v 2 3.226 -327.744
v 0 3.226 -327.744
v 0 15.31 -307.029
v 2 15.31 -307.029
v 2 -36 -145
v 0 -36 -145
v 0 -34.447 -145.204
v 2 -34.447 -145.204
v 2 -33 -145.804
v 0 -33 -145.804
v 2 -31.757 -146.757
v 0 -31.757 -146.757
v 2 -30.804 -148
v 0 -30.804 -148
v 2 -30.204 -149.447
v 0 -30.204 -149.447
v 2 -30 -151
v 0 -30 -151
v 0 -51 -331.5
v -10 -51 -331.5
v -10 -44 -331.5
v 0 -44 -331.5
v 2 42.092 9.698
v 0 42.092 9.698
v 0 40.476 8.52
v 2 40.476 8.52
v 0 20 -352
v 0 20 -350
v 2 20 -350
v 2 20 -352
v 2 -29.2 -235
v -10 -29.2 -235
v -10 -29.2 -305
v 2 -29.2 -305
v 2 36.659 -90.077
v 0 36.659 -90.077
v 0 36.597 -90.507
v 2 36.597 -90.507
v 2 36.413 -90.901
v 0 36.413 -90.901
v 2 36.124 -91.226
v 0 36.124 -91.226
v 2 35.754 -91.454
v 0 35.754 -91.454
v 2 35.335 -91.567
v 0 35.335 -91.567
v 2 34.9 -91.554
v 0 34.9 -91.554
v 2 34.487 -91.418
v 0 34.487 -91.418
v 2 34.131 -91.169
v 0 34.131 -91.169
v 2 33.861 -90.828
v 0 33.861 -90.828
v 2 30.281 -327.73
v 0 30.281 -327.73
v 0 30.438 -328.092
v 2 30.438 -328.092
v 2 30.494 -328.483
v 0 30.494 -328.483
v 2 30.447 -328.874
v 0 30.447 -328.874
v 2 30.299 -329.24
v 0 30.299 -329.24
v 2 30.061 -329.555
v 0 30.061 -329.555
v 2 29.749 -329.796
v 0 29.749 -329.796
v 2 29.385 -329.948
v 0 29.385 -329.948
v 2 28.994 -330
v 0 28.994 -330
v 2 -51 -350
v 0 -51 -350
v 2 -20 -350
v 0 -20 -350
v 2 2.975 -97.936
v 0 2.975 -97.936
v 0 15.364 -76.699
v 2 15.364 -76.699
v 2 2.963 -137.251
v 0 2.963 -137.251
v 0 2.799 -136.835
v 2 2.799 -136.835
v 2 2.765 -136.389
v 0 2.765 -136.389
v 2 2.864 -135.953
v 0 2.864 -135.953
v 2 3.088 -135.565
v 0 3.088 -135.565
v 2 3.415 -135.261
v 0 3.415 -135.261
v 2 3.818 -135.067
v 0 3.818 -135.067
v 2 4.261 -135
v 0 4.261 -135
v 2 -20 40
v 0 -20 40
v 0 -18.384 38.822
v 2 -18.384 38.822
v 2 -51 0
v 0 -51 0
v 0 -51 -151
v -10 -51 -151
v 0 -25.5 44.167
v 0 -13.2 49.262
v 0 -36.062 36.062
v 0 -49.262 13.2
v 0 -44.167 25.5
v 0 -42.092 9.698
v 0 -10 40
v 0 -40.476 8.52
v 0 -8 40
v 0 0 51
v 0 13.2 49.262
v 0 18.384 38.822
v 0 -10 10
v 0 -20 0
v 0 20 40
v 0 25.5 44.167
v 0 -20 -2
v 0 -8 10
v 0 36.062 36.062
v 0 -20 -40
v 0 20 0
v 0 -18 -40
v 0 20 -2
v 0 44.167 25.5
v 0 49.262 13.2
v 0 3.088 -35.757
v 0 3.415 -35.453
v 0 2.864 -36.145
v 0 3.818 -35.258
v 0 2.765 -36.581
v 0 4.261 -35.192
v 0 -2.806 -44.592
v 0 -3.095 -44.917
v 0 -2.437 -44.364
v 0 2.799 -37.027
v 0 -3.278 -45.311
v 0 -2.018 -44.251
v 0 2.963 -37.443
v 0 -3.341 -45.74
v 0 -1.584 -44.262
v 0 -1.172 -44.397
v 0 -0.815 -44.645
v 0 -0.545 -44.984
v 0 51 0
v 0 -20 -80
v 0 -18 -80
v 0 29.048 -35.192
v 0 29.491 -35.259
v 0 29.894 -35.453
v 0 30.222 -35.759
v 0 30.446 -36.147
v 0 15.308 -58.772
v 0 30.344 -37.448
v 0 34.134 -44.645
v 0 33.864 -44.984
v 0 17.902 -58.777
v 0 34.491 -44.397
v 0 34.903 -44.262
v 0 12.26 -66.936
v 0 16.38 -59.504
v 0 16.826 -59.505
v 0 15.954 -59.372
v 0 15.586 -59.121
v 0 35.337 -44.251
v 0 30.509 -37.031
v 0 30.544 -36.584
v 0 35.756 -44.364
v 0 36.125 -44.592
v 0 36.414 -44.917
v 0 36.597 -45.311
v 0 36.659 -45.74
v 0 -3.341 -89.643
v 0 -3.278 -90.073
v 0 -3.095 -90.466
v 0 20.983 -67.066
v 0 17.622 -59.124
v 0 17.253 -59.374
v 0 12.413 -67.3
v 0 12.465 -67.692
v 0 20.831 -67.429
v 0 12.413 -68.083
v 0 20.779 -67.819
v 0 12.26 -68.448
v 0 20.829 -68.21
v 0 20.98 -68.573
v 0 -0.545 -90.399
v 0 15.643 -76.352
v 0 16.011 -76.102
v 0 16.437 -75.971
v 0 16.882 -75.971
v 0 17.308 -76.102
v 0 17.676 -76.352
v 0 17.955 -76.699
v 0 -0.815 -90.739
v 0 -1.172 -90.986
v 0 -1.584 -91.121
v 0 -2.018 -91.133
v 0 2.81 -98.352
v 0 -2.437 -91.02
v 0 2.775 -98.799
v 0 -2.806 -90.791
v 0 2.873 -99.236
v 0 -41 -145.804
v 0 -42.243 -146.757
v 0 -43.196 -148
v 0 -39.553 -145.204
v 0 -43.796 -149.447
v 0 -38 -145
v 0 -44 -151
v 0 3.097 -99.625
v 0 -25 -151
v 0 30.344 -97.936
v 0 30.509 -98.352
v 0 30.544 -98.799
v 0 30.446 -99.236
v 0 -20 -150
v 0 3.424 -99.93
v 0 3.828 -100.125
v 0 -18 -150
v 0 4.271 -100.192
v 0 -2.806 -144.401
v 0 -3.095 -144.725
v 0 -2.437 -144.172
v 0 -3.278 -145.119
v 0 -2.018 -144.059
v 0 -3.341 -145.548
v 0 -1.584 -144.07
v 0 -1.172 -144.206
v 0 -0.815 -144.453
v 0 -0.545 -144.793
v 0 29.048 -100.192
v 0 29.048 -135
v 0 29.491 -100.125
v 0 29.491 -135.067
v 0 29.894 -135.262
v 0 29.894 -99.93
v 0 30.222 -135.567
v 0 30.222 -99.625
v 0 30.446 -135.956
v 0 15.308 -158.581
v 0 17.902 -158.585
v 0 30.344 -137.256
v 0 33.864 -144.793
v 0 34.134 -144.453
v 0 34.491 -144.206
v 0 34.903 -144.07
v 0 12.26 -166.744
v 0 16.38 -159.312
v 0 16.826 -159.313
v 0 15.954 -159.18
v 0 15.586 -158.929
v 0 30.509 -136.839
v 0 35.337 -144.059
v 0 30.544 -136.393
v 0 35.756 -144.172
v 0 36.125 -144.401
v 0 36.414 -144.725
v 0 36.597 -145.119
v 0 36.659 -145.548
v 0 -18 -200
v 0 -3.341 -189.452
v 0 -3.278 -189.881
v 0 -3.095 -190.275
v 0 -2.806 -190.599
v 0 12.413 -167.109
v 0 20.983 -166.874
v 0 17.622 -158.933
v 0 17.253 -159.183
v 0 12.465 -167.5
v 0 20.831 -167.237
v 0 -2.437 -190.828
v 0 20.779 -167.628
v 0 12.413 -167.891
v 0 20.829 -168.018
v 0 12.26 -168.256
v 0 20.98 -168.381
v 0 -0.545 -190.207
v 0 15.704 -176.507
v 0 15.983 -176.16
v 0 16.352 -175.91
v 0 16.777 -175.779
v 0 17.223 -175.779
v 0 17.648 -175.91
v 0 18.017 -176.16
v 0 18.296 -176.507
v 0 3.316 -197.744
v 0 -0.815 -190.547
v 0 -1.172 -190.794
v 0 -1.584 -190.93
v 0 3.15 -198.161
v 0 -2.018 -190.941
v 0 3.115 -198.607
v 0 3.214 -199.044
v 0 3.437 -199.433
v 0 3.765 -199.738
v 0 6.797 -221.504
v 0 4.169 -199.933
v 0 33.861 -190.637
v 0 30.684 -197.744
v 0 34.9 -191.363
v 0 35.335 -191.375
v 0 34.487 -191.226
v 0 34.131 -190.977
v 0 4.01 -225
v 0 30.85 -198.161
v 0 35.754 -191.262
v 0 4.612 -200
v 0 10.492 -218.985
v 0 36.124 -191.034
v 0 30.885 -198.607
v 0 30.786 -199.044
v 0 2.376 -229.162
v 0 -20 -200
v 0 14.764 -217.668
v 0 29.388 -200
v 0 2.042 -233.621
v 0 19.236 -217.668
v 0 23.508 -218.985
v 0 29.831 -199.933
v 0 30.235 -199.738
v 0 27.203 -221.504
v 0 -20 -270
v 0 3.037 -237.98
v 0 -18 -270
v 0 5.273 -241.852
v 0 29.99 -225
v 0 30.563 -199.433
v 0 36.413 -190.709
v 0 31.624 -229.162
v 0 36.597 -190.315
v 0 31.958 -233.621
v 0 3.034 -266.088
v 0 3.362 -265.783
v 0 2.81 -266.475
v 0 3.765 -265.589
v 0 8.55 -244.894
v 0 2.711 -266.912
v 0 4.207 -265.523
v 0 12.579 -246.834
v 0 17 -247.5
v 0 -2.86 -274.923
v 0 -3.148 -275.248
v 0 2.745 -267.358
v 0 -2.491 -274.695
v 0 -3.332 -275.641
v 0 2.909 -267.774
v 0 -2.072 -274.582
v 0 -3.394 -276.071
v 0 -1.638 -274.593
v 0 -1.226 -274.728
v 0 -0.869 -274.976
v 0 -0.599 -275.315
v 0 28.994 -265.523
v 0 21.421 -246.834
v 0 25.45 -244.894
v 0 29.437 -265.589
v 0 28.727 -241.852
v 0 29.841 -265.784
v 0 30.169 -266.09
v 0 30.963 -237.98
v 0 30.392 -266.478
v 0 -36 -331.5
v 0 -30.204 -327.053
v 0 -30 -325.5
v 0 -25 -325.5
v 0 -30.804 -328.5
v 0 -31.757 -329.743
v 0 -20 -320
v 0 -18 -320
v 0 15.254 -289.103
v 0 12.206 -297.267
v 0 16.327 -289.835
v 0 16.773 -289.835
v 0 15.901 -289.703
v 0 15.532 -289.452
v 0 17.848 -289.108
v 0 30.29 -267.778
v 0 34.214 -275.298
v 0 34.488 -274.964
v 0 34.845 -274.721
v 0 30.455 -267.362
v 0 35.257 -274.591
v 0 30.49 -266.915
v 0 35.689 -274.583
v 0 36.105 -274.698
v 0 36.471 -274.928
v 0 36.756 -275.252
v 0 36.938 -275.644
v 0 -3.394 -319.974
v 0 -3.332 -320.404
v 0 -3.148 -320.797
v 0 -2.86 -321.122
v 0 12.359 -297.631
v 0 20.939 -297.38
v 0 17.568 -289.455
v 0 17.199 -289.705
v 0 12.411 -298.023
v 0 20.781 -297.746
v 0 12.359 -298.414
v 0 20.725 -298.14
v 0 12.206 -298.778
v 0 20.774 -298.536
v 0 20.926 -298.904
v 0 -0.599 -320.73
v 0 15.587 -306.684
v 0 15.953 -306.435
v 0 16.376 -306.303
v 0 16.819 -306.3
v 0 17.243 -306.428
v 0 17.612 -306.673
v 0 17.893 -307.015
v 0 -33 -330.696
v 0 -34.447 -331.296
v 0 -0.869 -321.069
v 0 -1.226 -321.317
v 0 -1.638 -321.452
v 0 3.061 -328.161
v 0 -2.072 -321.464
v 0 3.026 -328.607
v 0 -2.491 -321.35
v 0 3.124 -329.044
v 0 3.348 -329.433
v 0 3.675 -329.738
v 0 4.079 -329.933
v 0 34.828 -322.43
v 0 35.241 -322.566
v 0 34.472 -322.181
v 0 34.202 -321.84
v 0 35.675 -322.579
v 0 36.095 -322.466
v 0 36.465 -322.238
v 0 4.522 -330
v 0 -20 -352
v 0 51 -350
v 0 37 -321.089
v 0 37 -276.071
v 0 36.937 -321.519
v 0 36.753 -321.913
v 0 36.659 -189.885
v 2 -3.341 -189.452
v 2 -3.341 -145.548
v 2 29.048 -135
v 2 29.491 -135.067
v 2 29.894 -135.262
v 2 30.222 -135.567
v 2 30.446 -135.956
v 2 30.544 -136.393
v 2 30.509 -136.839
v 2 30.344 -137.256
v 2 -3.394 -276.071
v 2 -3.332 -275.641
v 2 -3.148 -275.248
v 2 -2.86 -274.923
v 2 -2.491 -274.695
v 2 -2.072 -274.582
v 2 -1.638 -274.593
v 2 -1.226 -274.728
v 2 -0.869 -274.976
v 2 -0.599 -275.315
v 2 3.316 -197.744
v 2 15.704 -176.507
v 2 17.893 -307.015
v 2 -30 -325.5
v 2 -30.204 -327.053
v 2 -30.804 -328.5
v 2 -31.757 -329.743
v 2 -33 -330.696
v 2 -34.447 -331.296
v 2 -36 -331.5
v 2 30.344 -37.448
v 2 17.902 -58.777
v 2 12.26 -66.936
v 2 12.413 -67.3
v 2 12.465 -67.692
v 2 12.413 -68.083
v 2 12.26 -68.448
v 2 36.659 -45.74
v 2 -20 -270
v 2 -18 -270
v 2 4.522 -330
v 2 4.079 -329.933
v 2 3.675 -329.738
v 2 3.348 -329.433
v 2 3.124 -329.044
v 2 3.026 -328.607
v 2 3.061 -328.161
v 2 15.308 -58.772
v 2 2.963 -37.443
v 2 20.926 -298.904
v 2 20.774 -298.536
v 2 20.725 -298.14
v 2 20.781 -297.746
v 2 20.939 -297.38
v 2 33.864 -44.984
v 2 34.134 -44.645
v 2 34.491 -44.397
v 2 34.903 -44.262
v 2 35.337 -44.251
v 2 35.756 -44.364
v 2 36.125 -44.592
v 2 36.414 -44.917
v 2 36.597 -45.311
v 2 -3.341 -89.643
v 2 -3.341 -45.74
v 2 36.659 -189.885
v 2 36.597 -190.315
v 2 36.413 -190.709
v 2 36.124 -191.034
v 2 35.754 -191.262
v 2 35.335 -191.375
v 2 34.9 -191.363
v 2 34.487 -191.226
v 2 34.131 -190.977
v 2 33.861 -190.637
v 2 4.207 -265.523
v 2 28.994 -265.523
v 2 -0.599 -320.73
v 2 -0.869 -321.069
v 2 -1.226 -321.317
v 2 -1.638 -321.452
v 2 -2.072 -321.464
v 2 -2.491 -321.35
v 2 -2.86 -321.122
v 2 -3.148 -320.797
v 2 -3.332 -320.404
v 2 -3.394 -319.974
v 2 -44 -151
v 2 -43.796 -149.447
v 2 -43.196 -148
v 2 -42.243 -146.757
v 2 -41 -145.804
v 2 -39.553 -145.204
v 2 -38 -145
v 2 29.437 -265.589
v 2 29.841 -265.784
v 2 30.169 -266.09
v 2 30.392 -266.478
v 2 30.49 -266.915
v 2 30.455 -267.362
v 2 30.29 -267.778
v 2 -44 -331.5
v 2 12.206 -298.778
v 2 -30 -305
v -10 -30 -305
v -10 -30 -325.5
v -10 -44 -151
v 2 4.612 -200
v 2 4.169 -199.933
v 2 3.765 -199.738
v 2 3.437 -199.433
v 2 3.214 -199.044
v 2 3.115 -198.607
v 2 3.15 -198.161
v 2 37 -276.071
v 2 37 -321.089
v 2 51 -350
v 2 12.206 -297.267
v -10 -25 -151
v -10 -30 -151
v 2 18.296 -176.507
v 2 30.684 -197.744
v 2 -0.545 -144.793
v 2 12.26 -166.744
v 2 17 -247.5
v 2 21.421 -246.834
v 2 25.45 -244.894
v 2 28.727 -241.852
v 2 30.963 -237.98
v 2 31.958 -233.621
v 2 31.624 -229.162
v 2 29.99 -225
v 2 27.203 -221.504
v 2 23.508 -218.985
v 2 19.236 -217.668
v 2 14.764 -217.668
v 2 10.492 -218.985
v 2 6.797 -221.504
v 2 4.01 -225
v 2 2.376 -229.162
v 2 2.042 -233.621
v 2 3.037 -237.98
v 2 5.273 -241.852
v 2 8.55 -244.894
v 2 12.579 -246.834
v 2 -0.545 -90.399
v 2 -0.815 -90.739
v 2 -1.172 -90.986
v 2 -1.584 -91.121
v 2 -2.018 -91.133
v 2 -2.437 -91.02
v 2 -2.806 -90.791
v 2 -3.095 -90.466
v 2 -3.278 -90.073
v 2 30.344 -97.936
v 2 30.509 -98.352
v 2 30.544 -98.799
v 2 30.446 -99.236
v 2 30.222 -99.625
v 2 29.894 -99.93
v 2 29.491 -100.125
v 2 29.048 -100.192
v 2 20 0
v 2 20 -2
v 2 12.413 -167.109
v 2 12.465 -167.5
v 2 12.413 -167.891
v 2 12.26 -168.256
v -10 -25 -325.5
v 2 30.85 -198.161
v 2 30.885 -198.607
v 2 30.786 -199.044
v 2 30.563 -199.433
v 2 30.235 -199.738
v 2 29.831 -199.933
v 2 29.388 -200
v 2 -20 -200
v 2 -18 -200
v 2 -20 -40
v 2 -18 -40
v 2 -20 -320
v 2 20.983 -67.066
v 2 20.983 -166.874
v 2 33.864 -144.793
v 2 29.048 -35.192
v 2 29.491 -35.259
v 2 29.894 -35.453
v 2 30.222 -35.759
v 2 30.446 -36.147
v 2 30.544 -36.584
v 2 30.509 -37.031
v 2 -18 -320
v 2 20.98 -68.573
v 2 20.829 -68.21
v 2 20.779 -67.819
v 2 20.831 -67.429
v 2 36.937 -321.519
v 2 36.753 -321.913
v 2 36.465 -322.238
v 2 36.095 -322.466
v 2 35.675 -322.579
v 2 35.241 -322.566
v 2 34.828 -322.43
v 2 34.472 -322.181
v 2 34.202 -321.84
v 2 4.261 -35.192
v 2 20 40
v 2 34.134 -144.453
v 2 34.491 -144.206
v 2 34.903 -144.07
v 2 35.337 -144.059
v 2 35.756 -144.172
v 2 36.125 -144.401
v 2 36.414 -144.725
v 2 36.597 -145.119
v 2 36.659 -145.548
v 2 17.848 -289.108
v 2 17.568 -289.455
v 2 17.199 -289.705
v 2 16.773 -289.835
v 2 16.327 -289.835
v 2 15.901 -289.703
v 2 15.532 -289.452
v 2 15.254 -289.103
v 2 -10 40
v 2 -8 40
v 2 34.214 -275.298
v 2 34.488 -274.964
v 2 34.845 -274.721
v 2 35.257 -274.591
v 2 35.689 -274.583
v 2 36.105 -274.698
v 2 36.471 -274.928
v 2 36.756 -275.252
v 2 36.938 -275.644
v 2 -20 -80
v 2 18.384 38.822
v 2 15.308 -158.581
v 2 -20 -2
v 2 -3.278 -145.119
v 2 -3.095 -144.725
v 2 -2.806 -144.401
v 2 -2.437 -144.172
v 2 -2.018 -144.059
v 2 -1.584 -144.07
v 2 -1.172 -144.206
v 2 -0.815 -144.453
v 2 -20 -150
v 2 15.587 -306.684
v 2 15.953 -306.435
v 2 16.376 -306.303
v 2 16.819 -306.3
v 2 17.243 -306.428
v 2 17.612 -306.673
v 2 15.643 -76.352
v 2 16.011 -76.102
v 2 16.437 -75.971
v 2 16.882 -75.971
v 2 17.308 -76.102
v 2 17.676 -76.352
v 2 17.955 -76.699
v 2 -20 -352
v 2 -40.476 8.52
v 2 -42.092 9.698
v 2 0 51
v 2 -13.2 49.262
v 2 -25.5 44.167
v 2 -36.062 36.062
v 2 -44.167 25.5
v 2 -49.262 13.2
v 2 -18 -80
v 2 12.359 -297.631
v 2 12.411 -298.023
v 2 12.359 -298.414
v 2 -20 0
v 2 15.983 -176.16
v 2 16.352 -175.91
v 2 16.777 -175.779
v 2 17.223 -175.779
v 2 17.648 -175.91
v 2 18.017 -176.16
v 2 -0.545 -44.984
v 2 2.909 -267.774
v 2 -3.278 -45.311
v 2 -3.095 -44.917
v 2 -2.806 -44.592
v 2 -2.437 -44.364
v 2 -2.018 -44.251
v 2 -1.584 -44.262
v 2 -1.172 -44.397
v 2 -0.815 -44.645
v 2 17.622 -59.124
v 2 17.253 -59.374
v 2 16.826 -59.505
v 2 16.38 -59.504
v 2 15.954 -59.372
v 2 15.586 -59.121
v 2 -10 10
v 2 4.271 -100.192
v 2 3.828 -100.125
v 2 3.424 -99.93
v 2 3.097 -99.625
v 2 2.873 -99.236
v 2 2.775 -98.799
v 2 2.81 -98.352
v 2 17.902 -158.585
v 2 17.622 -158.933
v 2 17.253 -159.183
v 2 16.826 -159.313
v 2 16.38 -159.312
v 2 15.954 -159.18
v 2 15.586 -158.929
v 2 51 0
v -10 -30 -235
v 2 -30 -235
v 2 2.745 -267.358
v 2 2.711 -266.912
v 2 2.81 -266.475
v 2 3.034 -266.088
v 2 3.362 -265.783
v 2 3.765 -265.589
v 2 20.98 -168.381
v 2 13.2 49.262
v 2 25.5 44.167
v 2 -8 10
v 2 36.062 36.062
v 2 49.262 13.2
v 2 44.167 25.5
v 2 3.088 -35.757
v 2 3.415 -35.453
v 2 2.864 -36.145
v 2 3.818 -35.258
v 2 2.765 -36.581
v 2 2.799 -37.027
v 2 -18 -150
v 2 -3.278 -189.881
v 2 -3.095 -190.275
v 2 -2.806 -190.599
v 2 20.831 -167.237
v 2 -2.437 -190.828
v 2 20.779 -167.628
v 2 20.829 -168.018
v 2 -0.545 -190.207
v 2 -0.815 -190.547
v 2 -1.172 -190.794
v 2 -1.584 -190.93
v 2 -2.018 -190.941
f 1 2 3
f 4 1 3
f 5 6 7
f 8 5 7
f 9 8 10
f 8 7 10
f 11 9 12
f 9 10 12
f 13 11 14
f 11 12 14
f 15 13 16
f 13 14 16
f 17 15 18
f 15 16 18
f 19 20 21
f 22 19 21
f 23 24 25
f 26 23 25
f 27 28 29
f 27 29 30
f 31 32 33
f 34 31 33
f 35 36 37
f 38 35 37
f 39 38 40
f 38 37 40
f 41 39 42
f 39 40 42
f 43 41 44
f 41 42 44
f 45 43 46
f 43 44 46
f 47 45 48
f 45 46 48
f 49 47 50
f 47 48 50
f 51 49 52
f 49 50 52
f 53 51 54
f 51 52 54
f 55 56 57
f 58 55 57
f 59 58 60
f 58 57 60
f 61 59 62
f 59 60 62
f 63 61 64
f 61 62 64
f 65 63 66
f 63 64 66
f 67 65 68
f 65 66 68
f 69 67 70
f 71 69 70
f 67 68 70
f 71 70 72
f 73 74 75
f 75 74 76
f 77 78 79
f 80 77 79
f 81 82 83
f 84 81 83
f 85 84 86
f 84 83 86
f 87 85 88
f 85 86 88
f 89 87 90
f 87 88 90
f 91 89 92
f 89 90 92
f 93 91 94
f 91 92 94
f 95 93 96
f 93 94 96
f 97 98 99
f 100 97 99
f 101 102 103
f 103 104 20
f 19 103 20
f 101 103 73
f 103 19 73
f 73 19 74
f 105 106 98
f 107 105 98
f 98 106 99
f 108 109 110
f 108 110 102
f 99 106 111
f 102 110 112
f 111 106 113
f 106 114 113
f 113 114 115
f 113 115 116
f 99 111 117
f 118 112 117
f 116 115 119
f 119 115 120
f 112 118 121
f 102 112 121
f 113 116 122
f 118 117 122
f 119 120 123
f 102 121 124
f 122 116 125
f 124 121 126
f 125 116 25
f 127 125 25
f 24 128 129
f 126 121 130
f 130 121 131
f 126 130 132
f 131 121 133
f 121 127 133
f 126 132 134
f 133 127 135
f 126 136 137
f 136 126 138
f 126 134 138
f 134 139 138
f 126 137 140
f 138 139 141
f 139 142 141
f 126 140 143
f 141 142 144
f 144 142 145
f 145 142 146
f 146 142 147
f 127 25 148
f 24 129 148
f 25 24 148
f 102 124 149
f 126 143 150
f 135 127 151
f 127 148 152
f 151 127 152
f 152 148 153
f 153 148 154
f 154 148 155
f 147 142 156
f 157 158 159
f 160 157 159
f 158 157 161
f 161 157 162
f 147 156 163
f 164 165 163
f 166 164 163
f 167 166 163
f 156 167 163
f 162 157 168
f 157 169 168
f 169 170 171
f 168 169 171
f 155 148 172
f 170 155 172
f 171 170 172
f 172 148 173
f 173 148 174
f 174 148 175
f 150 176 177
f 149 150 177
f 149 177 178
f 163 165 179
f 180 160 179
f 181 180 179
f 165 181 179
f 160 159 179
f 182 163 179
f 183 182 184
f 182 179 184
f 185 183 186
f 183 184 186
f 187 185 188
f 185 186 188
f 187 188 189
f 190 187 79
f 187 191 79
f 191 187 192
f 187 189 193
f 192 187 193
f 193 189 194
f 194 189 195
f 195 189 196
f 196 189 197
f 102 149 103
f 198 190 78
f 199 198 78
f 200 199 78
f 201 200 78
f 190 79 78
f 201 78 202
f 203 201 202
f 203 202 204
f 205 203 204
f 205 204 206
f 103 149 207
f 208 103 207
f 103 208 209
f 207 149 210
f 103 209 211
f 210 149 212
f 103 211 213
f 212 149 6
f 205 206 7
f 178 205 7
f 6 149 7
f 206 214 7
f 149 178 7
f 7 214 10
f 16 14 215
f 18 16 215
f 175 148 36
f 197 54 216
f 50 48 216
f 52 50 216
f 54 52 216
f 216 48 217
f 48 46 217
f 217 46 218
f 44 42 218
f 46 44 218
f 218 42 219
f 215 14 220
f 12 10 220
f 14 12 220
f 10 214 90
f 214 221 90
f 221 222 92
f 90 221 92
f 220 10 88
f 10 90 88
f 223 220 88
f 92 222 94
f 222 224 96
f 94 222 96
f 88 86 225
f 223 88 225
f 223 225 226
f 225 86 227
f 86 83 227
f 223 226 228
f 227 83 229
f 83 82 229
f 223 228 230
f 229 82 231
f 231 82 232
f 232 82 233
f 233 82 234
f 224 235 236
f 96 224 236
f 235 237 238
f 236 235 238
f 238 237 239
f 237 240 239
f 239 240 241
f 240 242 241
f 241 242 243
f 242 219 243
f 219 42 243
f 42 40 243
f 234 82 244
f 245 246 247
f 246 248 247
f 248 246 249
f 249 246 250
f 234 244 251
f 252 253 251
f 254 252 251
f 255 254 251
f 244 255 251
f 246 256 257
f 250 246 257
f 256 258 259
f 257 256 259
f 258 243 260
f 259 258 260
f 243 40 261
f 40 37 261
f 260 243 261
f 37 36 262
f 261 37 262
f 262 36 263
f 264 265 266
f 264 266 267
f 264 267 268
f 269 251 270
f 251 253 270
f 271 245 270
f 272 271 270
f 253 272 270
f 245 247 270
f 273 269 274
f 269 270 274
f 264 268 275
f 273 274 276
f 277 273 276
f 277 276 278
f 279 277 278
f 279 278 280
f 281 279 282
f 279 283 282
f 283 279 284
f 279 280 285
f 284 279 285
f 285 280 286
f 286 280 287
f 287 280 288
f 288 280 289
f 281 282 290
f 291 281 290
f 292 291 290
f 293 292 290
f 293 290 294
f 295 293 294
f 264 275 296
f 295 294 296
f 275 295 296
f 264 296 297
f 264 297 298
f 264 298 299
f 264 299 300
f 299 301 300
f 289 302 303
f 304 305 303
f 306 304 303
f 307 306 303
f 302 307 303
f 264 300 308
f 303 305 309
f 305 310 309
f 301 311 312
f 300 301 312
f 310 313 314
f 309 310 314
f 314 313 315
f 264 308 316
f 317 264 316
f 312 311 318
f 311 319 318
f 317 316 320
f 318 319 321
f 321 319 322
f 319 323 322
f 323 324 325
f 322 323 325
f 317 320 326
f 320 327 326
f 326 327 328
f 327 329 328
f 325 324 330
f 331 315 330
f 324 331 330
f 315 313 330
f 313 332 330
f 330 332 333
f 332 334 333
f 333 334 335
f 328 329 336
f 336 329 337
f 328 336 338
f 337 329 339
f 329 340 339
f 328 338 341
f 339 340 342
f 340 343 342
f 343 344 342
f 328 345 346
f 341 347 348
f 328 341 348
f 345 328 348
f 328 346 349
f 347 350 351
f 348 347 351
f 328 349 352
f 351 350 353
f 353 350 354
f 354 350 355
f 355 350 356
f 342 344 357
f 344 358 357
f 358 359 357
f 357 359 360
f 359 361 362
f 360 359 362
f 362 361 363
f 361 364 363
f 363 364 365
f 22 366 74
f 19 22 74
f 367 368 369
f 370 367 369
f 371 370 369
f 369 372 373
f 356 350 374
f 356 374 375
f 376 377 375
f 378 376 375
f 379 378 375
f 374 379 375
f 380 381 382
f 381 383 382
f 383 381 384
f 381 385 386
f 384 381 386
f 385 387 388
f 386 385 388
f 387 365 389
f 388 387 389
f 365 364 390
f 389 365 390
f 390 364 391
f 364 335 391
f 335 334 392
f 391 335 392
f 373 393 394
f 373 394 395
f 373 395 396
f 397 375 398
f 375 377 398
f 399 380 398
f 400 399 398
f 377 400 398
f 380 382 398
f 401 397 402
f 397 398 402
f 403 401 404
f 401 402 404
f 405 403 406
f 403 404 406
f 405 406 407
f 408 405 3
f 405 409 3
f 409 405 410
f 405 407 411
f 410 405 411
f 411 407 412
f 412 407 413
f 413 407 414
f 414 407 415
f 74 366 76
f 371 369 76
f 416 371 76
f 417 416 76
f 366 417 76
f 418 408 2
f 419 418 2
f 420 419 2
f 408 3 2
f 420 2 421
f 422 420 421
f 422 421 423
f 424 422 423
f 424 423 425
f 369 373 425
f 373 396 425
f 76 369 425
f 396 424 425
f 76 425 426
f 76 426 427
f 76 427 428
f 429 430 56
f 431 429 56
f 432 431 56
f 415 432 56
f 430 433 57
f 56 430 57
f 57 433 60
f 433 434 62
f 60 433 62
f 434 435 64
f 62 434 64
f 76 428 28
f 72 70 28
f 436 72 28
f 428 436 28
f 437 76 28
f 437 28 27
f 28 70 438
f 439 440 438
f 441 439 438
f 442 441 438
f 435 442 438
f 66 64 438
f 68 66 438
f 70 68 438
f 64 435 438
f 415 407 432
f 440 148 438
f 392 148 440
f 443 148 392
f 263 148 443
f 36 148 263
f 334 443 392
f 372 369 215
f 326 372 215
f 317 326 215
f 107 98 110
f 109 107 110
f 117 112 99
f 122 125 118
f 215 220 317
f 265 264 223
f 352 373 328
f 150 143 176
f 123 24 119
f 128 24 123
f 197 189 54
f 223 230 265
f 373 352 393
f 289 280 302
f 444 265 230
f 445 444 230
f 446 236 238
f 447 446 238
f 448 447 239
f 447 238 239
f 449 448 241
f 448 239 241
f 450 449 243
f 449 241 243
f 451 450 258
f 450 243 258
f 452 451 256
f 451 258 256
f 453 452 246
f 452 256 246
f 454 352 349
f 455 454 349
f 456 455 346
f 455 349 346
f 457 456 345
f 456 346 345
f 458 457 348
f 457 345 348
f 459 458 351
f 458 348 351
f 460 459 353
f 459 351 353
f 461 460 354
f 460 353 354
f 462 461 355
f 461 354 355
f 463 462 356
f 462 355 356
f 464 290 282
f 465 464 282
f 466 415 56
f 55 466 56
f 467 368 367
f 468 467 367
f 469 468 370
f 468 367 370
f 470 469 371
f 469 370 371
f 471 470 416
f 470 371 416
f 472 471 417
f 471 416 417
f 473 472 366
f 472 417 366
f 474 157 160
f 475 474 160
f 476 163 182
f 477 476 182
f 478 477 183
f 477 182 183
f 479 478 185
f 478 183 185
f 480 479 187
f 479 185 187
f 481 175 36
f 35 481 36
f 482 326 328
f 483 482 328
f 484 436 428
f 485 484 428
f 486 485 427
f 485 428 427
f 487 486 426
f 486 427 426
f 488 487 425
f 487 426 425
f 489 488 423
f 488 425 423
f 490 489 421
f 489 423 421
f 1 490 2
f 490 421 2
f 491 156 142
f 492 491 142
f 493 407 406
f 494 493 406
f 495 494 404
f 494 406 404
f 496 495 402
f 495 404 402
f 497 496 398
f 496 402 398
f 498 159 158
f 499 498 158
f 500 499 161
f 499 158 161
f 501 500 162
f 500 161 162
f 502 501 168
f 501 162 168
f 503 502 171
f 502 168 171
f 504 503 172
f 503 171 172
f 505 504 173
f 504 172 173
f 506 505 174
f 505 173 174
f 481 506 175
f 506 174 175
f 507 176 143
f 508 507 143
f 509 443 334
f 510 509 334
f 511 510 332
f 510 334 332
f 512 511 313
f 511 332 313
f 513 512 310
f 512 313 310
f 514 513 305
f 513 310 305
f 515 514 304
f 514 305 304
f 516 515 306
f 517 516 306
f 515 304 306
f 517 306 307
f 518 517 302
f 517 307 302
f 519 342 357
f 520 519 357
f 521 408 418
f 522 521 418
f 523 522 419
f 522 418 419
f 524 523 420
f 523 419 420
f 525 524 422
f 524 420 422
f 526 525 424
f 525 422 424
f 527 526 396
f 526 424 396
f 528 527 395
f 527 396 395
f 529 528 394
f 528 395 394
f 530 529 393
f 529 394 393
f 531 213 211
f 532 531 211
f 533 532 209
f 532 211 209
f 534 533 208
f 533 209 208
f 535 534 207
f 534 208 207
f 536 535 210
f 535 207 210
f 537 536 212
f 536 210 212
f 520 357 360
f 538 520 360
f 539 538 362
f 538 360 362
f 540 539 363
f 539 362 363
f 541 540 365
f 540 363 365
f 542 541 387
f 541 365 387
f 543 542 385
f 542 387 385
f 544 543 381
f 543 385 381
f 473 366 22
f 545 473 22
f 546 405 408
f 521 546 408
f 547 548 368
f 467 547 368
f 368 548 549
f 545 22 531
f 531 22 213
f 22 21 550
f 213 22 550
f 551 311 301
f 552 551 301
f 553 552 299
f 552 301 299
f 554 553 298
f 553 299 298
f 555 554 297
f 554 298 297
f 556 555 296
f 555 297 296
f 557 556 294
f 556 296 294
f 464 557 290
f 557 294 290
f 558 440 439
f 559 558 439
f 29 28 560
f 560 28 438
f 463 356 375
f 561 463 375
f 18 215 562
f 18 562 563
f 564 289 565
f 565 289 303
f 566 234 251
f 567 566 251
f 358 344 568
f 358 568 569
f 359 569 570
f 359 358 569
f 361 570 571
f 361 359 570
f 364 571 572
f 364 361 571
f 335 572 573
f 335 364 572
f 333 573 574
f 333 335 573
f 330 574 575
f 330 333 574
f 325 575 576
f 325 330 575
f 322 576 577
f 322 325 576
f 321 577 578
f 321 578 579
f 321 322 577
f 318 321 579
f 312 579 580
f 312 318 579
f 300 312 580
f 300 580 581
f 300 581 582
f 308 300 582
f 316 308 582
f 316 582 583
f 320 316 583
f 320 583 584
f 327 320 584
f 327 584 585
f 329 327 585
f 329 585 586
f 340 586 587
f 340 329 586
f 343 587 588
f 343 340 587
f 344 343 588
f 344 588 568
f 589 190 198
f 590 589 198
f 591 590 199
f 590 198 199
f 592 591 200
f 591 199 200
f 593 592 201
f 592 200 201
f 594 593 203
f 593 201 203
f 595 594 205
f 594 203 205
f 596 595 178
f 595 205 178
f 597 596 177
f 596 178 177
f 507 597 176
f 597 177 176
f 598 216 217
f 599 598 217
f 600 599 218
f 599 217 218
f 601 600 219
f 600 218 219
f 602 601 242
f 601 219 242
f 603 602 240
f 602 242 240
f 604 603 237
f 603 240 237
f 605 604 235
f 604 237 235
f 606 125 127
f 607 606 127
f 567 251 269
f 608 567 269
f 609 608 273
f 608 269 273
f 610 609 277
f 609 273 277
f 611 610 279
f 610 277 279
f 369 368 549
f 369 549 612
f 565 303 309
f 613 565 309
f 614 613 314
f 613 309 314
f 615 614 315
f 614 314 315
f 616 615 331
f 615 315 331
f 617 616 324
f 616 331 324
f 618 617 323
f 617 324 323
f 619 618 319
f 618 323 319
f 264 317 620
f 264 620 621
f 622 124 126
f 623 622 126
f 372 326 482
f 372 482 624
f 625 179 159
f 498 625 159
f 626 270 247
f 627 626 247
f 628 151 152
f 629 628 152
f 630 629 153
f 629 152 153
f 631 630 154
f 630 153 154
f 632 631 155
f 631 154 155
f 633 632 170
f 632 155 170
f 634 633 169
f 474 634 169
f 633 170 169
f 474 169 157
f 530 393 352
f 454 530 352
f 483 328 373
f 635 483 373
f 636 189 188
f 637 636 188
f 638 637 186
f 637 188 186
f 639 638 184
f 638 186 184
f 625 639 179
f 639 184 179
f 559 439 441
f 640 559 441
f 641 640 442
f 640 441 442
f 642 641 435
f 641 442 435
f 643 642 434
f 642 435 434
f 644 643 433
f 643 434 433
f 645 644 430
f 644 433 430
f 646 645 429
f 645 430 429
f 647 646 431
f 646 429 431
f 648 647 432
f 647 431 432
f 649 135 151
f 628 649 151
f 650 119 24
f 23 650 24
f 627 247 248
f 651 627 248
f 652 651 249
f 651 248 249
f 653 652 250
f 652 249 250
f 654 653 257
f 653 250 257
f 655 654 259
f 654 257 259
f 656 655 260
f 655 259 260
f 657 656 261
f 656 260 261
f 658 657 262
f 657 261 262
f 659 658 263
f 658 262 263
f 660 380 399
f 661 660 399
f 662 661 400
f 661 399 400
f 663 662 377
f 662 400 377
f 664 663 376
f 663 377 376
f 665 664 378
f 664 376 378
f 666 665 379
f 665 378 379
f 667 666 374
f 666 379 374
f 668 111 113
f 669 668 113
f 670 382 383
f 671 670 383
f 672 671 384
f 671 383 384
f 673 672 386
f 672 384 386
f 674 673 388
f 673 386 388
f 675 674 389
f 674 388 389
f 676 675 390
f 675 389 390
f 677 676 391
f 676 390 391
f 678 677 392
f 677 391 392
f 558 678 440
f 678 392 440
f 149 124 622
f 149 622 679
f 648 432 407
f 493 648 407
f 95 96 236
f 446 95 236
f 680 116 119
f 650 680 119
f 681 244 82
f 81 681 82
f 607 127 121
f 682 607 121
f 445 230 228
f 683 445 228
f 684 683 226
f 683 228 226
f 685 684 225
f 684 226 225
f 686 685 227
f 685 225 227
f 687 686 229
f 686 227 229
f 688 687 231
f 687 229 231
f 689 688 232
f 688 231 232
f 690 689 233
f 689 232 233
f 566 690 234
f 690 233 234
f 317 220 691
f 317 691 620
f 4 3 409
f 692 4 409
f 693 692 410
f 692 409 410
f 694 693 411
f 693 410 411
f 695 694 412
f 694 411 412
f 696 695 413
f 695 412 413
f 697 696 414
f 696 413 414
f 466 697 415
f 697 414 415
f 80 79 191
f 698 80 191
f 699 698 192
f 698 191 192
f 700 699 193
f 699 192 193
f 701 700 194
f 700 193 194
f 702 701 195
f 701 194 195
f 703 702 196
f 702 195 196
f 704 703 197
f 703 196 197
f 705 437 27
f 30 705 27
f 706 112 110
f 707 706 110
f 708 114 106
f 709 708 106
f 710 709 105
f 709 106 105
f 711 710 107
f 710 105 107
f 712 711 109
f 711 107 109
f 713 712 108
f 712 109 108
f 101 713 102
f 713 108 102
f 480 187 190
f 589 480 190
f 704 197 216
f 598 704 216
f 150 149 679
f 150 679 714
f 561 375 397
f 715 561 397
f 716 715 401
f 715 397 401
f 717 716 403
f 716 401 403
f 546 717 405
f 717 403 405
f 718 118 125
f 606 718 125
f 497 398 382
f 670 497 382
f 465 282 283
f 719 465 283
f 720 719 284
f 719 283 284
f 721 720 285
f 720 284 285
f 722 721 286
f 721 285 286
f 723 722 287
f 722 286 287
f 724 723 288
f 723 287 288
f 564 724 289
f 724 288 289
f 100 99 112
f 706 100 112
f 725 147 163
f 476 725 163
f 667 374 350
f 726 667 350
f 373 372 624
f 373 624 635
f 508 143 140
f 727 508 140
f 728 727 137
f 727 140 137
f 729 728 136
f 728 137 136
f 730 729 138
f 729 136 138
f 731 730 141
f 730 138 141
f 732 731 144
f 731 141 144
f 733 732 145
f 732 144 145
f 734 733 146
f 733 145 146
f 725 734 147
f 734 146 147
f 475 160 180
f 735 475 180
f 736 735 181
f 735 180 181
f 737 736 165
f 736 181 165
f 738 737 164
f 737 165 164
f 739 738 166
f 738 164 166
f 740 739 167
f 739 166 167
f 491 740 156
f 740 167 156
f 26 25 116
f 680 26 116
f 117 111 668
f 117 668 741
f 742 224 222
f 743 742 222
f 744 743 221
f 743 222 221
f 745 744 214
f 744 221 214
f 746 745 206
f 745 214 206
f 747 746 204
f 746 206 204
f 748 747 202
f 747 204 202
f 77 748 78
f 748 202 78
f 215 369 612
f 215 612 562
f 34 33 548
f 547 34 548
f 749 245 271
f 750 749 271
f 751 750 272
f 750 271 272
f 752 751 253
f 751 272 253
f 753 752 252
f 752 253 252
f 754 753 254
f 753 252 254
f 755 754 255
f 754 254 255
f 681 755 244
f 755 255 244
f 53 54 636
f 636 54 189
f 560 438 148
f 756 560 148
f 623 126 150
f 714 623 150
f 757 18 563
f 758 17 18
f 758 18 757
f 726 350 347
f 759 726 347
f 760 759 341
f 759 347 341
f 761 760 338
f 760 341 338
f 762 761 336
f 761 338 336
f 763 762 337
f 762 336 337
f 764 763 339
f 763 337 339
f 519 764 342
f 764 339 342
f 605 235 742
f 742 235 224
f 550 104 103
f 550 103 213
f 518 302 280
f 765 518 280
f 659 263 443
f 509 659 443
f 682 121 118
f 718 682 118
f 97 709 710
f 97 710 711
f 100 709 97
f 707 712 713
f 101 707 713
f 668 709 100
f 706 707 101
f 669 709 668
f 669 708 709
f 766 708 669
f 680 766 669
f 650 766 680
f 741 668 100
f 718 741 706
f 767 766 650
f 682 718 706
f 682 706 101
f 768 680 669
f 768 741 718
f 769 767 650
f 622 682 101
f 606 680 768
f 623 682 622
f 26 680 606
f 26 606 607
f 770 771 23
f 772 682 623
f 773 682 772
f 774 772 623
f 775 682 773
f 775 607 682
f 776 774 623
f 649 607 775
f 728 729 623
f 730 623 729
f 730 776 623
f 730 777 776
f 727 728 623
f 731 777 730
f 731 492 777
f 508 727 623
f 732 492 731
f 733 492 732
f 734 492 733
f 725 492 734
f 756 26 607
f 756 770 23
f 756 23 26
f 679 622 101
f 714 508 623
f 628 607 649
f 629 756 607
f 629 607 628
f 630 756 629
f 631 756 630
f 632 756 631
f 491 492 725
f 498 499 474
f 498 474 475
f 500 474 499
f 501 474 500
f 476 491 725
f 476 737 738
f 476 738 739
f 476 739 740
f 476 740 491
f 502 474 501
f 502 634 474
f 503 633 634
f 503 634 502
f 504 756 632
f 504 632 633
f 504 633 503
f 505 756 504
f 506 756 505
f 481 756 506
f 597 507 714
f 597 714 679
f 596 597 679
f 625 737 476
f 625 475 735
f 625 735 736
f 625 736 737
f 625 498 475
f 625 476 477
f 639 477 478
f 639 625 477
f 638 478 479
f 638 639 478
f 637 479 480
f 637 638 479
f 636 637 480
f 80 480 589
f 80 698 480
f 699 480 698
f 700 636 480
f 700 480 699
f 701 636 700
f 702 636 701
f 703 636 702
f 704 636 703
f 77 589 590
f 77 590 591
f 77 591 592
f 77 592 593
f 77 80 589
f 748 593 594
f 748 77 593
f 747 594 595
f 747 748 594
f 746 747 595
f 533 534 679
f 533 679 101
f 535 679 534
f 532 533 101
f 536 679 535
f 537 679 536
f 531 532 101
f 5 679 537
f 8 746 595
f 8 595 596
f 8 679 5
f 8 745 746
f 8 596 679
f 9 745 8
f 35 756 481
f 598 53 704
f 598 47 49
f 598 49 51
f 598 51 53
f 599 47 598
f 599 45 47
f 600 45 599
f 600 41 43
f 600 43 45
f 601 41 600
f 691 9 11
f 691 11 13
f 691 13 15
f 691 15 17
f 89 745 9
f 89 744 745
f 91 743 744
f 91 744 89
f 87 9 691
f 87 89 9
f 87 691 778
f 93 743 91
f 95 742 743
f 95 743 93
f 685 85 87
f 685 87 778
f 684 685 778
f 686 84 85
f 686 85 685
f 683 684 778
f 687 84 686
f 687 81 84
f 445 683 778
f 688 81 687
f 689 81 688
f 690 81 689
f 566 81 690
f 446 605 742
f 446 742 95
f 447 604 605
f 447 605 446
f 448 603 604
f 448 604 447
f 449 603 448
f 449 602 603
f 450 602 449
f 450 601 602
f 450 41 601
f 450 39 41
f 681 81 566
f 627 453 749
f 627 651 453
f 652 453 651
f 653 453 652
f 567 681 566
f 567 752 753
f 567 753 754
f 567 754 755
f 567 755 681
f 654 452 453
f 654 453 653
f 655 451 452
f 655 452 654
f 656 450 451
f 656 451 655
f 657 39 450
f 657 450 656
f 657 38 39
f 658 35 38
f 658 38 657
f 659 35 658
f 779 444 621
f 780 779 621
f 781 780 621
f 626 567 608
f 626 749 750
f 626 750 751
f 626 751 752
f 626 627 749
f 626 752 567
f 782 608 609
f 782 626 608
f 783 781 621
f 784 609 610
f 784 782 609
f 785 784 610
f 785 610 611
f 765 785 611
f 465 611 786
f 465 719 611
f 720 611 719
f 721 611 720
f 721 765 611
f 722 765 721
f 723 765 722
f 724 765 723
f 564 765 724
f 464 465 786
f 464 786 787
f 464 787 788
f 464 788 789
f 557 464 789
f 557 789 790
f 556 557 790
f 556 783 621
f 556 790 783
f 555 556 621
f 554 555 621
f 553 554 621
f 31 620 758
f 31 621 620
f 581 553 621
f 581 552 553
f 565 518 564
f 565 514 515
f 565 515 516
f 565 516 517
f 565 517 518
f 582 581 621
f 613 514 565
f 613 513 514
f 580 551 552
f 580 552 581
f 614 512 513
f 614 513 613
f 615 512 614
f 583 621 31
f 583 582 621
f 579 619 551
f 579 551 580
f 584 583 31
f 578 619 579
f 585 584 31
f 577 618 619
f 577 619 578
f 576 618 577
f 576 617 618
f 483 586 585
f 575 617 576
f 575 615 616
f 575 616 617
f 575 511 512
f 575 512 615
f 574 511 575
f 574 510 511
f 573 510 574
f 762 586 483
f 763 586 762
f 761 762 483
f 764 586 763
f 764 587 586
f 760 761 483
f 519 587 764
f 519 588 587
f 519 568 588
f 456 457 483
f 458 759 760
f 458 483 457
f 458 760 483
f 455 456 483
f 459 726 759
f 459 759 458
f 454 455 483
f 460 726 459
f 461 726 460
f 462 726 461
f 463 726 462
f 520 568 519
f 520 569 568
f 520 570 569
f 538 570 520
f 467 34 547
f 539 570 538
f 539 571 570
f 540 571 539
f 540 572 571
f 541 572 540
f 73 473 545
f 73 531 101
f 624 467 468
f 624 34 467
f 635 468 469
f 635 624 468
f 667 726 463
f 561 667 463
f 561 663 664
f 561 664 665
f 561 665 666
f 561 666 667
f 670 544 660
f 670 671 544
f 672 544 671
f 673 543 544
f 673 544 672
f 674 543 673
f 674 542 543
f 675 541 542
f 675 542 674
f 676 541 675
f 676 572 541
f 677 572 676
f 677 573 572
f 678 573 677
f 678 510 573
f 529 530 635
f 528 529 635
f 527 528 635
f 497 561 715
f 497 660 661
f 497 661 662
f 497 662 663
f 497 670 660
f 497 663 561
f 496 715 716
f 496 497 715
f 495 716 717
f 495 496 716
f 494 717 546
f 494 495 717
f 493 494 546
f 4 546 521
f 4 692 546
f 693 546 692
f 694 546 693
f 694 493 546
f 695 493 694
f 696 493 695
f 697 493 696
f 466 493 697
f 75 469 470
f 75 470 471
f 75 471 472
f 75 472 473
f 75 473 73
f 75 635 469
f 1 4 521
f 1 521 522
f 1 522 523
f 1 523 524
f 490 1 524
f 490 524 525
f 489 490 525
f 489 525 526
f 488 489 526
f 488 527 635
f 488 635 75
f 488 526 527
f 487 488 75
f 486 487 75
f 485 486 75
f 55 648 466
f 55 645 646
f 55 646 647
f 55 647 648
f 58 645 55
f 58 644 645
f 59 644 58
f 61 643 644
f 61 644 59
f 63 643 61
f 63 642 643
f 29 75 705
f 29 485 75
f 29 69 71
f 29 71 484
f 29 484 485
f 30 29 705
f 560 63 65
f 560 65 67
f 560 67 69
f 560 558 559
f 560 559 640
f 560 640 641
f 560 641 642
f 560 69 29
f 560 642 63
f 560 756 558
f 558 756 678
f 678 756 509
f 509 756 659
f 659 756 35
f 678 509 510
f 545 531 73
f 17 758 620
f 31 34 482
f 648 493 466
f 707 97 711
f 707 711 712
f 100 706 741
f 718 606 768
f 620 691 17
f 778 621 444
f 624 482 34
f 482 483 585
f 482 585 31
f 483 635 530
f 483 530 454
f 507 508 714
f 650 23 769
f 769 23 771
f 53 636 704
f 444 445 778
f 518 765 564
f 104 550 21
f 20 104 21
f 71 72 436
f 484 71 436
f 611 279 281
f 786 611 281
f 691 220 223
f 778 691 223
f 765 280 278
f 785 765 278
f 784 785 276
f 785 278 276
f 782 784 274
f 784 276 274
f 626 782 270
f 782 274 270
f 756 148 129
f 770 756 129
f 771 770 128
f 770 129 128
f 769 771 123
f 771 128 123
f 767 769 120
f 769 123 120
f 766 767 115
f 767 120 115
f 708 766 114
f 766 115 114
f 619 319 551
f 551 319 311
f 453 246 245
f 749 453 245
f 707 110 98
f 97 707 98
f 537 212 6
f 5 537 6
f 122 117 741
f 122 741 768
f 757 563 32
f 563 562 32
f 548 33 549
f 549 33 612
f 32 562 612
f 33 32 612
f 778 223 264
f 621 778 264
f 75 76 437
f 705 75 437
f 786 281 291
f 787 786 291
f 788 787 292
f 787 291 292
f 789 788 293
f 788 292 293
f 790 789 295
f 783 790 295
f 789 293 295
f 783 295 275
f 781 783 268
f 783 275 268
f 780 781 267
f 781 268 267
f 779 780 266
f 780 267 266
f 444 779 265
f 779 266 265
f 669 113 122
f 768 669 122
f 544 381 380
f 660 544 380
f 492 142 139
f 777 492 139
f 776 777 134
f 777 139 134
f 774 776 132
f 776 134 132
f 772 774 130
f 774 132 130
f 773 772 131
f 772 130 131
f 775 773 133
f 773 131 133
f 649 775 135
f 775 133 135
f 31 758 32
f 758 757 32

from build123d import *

# Parameters (mm, degrees)
SKETCH_1_W      = 40
SKETCH_1_H      = 2
SKETCH_1_W_2    = 50
SKETCH_1_R      = 15
SKETCH_1_W_3    = 30
SKETCH_1_W_4    = 2
SKETCH_1_H_2    = 40
EXTRUDE_3_DEPTH = 2
SKETCH_2_W      = 180.5
SKETCH_2_H      = 7
EXTRUDE_4_DEPTH = 12


with BuildPart() as part:
    # 草图1 → 凸台-拉伸3 (new body)
    # profile 1 of 4: a face of its own
    with BuildSketch(Plane(origin=(0, 0, 0), x_dir=(0, 0, -1), z_dir=(1, 0, 0))):
        Polygon((139, 51), (0, 51), (0, 20), (2, 20), (2, -20), (0, -20), (0, -51), (350, -51), (350, -20), (350, 20), (350, 51), (337.5, 51), (331.5, 51), (145, 51), align=None)
        with Locations((59.999999544, -18.999999639)):
            Rectangle(SKETCH_1_W, SKETCH_1_H, mode=Mode.SUBTRACT)
        with BuildLine():
            Line((145, -38), (145, -36))
            ThreePointArc((145, -36), (146.757359313, -31.757359313), (151, -30))
            Line((151, -30), (235, -30))
            Line((235, -30), (235, -29.2))
            Line((235, -29.2), (305, -29.2))
            Line((305, -29.2), (305, -30))
            Line((305, -30), (325.5, -30))
            ThreePointArc((325.5, -30), (329.742640687, -31.757359313), (331.5, -36))
            Line((331.5, -36), (331.5, -39))
            Line((331.5, -39), (331.5, -44))
            Line((331.5, -44), (325.5, -44))
            Line((325.5, -44), (151, -44))
            ThreePointArc((151, -44), (146.757359313, -42.242640687), (145, -38))
        make_face(mode=Mode.SUBTRACT)
        with Locations((174.999999544, -18.999999639)):
            Rectangle(SKETCH_1_W_2, SKETCH_1_H, mode=Mode.SUBTRACT)
        with Locations((294.999999544, -18.999999639)):
            Rectangle(SKETCH_1_W_2, SKETCH_1_H, mode=Mode.SUBTRACT)
        with BuildLine():
            Line((35.191745107, 4.260800891), (35.191745107, 29.047933032))
            ThreePointArc((35.191745107, 29.047933032), (35.944654017, 30.348646261), (37.447551645, 30.343601384))
            Line((37.447551645, 30.343601384), (58.776761499, 17.901562302))
            ThreePointArc((58.776761499, 17.901562302), (59.520952796, 16.603345479), (58.772354511, 15.307664881))
            Line((58.772354511, 15.307664881), (37.443144656, 2.962571821))
            ThreePointArc((37.443144656, 2.962571821), (35.942445208, 2.961358833), (35.191745107, 4.260800891))
        make_face(mode=Mode.SUBTRACT)
        with BuildLine():
            Line((89.643364252, -3.340511469), (45.740125962, -3.340511469))
            ThreePointArc((45.740125962, -3.340511469), (44.292109641, -2.231981438), (44.984319423, -0.544843118))
            Line((44.984319423, -0.544843118), (66.935938568, 12.26026805))
            ThreePointArc((66.935938568, 12.26026805), (67.691745107, 12.464599699), (68.447551645, 12.26026805))
            Line((68.447551645, 12.26026805), (90.39917079, -0.544843118))
            ThreePointArc((90.39917079, -0.544843118), (91.091380572, -2.231981438), (89.643364252, -3.340511469))
        make_face(mode=Mode.SUBTRACT)
        with BuildLine():
            ThreePointArc((97.935938568, 30.343601384), (99.438836196, 30.348646261), (100.191745107, 29.047933032))
            Line((100.191745107, 29.047933032), (100.191745107, 4.27104403))
            ThreePointArc((100.191745107, 4.27104403), (99.438836196, 2.970330801), (97.935938568, 2.975375678))
            Line((97.935938568, 2.975375678), (76.698605138, 15.36382018))
            ThreePointArc((76.698605138, 15.36382018), (75.954411676, 16.659488531), (76.698605138, 17.955156882))
            Line((76.698605138, 17.955156882), (97.935938568, 30.343601384))
        make_face(mode=Mode.SUBTRACT)
        with BuildLine():
            Line((134.999999544, 4.260800891), (134.999999544, 29.047933032))
            ThreePointArc((134.999999544, 29.047933032), (135.752908454, 30.348646261), (137.255806082, 30.343601384))
            Line((137.255806082, 30.343601384), (158.585015936, 17.901562302))
            ThreePointArc((158.585015936, 17.901562302), (159.329207233, 16.603345479), (158.580608948, 15.307664881))
            Line((158.580608948, 15.307664881), (137.251399093, 2.962571821))
            ThreePointArc((137.251399093, 2.962571821), (135.750699645, 2.961358833), (134.999999544, 4.260800891))
        make_face(mode=Mode.SUBTRACT)
        with BuildLine():
            ThreePointArc((44.984319423, 33.86382018), (44.292109641, 35.5509585), (45.740125962, 36.659488531))
            Line((45.740125962, 36.659488531), (90.076890905, 36.659488531))
            ThreePointArc((90.076890905, 36.659488531), (91.525570236, 35.548497783), (90.828290455, 33.861259462))
            Line((90.828290455, 33.861259462), (68.573204266, 20.980280188))
            ThreePointArc((68.573204266, 20.980280188), (67.819256245, 20.778511422), (67.065998178, 20.982840906))
            Line((67.065998178, 20.982840906), (44.984319423, 33.86382018))
        make_face(mode=Mode.SUBTRACT)
        with BuildLine():
            Line((189.451618689, -3.340511469), (145.548380399, -3.340511469))
            ThreePointArc((145.548380399, -3.340511469), (144.100364078, -2.231981438), (144.79257386, -0.544843118))
            Line((144.79257386, -0.544843118), (166.744193005, 12.26026805))
            ThreePointArc((166.744193005, 12.26026805), (167.499999544, 12.464599699), (168.255806082, 12.26026805))
            Line((168.255806082, 12.26026805), (190.207425227, -0.544843118))
            ThreePointArc((190.207425227, -0.544843118), (190.899635009, -2.231981438), (189.451618689, -3.340511469))
        make_face(mode=Mode.SUBTRACT)
        with BuildLine():
            ThreePointArc((197.744193005, 30.684113214), (199.247090633, 30.689158091), (199.999999544, 29.388444862))
            Line((199.999999544, 29.388444862), (199.999999544, 4.61155586))
            ThreePointArc((199.999999544, 4.61155586), (199.247090633, 3.310842631), (197.744193005, 3.315887508))
            Line((197.744193005, 3.315887508), (176.506859575, 15.70433201))
            ThreePointArc((176.506859575, 15.70433201), (175.762666113, 17.000000361), (176.506859575, 18.295668712))
            Line((176.506859575, 18.295668712), (197.744193005, 30.684113214))
        make_face(mode=Mode.SUBTRACT)
        with Locations((232.499999544, 17.000000361)):
            Circle(SKETCH_1_R, mode=Mode.SUBTRACT)
        with BuildLine():
            Line((319.974166341, -3.394327578), (276.070928051, -3.394327578))
            ThreePointArc((276.070928051, -3.394327578), (274.622911731, -2.285797546), (275.315121513, -0.598659226))
            Line((275.315121513, -0.598659226), (297.266740658, 12.206451942))
            ThreePointArc((297.266740658, 12.206451942), (298.022547196, 12.41078359), (298.778353734, 12.206451942))
            Line((298.778353734, 12.206451942), (320.729972879, -0.598659226))
            ThreePointArc((320.729972879, -0.598659226), (321.422182661, -2.285797546), (319.974166341, -3.394327578))
        make_face(mode=Mode.SUBTRACT)
        with BuildLine():
            Line((265.522547196, 4.206984782), (265.522547196, 28.994116924))
            ThreePointArc((265.522547196, 28.994116924), (266.275456106, 30.294830153), (267.778353734, 30.289785275))
            Line((267.778353734, 30.289785275), (289.107563589, 17.847746193))
            ThreePointArc((289.107563589, 17.847746193), (289.851754885, 16.549529371), (289.1031566, 15.253848773))
            Line((289.1031566, 15.253848773), (267.773946745, 2.908755713))
            ThreePointArc((267.773946745, 2.908755713), (266.273247297, 2.907542724), (265.522547196, 4.206984782))
        make_face(mode=Mode.SUBTRACT)
        with BuildLine():
            ThreePointArc((327.730104048, 30.281463391), (329.239984934, 30.298885724), (329.999999544, 28.994116924))
            Line((329.999999544, 28.994116924), (329.999999544, 4.522047385))
            ThreePointArc((329.999999544, 4.522047385), (329.247090633, 3.221334156), (327.744193005, 3.226379034))
            Line((327.744193005, 3.226379034), (307.029407227, 15.310004071))
            ThreePointArc((307.029407227, 15.310004071), (306.285236078, 16.597490851), (307.01531827, 17.893018889))
            Line((307.01531827, 17.893018889), (327.730104048, 30.281463391))
        make_face(mode=Mode.SUBTRACT)
        with BuildLine():
            ThreePointArc((144.79257386, 33.86382018), (144.100364078, 35.5509585), (145.548380399, 36.659488531))
            Line((145.548380399, 36.659488531), (189.885145343, 36.659488531))
            ThreePointArc((189.885145343, 36.659488531), (191.333824673, 35.548497783), (190.636544892, 33.861259462))
            Line((190.636544892, 33.861259462), (168.381458703, 20.980280188))
            ThreePointArc((168.381458703, 20.980280188), (167.627510682, 20.778511422), (166.874252615, 20.982840906))
            Line((166.874252615, 20.982840906), (144.79257386, 33.86382018))
        make_face(mode=Mode.SUBTRACT)
        with BuildLine():
            ThreePointArc((275.298058871, 34.214436971), (274.625531032, 35.901033349), (276.070928051, 37.000000361))
            Line((276.070928051, 37.000000361), (321.088992302, 37.000000361))
            ThreePointArc((321.088992302, 37.000000361), (322.537671633, 35.889009613), (321.840391852, 34.201771291))
            Line((321.840391852, 34.201771291), (298.904006355, 20.926464079))
            ThreePointArc((298.904006355, 20.926464079), (298.140143214, 20.72474493), (297.379737626, 20.939129758))
            Line((297.379737626, 20.939129758), (275.298058871, 34.214436971))
        make_face(mode=Mode.SUBTRACT)
    # profile 2 of 4: a face of its own
    with BuildSketch(Plane(origin=(0, 0, 0), x_dir=(0, 0, -1), z_dir=(1, 0, 0))):
        with BuildLine():
            Line((0, 20), (0, 51))
            ThreePointArc((0, 51), (-36.062445841, 36.062445841), (-51, 0))
            Line((-51, 0), (0, 0))
            Line((0, 0), (0, 20))
        make_face()
        Polygon((-38.821768829, 18.383902445), (-40, 20), (-9.698170842, 42.091834457), (-8.519939671, 40.475736902), align=None, mode=Mode.SUBTRACT)
    # profile 3 of 4: a face of its own
    with BuildSketch(Plane(origin=(0, 0, 0), x_dir=(0, 0, -1), z_dir=(1, 0, 0))):
        with BuildLine():
            Line((0, 0), (-51, 0))
            ThreePointArc((-51, 0), (-36.062445841, -36.062445841), (0, -51))
            Line((0, -51), (0, -20))
            Line((0, -20), (0, 0))
        make_face()
        Polygon((-40, -20), (-38.821768829, -18.383902445), (-8.519939671, -40.475736902), (-9.698170842, -42.091834457), align=None, mode=Mode.SUBTRACT)
        with Locations((-25, -9)):
            Rectangle(SKETCH_1_W_3, SKETCH_1_H, mode=Mode.SUBTRACT)
    # profile 4 of 4: a face of its own
    with BuildSketch(Plane(origin=(0, 0, 0), x_dir=(0, 0, -1), z_dir=(1, 0, 0))):
        with Locations((351, 0)):
            Rectangle(SKETCH_1_W_4, SKETCH_1_H_2)
    extrude(amount=EXTRUDE_3_DEPTH)

    # 草图2 → 凸台-拉伸4 (add)
    with BuildSketch(Plane(origin=(2, 0, 0), x_dir=(0, 0, -1), z_dir=(1, 0, 0))):
        with Locations((241.25, -47.5)):
            Rectangle(SKETCH_2_W, SKETCH_2_H)
        Polygon((151, -30), (235, -30), (235, -29.2), (305, -29.2), (305, -30), (325.5, -30), (325.5, -25), (151, -25), align=None)
    extrude(amount=-EXTRUDE_4_DEPTH)


solid = part.part
